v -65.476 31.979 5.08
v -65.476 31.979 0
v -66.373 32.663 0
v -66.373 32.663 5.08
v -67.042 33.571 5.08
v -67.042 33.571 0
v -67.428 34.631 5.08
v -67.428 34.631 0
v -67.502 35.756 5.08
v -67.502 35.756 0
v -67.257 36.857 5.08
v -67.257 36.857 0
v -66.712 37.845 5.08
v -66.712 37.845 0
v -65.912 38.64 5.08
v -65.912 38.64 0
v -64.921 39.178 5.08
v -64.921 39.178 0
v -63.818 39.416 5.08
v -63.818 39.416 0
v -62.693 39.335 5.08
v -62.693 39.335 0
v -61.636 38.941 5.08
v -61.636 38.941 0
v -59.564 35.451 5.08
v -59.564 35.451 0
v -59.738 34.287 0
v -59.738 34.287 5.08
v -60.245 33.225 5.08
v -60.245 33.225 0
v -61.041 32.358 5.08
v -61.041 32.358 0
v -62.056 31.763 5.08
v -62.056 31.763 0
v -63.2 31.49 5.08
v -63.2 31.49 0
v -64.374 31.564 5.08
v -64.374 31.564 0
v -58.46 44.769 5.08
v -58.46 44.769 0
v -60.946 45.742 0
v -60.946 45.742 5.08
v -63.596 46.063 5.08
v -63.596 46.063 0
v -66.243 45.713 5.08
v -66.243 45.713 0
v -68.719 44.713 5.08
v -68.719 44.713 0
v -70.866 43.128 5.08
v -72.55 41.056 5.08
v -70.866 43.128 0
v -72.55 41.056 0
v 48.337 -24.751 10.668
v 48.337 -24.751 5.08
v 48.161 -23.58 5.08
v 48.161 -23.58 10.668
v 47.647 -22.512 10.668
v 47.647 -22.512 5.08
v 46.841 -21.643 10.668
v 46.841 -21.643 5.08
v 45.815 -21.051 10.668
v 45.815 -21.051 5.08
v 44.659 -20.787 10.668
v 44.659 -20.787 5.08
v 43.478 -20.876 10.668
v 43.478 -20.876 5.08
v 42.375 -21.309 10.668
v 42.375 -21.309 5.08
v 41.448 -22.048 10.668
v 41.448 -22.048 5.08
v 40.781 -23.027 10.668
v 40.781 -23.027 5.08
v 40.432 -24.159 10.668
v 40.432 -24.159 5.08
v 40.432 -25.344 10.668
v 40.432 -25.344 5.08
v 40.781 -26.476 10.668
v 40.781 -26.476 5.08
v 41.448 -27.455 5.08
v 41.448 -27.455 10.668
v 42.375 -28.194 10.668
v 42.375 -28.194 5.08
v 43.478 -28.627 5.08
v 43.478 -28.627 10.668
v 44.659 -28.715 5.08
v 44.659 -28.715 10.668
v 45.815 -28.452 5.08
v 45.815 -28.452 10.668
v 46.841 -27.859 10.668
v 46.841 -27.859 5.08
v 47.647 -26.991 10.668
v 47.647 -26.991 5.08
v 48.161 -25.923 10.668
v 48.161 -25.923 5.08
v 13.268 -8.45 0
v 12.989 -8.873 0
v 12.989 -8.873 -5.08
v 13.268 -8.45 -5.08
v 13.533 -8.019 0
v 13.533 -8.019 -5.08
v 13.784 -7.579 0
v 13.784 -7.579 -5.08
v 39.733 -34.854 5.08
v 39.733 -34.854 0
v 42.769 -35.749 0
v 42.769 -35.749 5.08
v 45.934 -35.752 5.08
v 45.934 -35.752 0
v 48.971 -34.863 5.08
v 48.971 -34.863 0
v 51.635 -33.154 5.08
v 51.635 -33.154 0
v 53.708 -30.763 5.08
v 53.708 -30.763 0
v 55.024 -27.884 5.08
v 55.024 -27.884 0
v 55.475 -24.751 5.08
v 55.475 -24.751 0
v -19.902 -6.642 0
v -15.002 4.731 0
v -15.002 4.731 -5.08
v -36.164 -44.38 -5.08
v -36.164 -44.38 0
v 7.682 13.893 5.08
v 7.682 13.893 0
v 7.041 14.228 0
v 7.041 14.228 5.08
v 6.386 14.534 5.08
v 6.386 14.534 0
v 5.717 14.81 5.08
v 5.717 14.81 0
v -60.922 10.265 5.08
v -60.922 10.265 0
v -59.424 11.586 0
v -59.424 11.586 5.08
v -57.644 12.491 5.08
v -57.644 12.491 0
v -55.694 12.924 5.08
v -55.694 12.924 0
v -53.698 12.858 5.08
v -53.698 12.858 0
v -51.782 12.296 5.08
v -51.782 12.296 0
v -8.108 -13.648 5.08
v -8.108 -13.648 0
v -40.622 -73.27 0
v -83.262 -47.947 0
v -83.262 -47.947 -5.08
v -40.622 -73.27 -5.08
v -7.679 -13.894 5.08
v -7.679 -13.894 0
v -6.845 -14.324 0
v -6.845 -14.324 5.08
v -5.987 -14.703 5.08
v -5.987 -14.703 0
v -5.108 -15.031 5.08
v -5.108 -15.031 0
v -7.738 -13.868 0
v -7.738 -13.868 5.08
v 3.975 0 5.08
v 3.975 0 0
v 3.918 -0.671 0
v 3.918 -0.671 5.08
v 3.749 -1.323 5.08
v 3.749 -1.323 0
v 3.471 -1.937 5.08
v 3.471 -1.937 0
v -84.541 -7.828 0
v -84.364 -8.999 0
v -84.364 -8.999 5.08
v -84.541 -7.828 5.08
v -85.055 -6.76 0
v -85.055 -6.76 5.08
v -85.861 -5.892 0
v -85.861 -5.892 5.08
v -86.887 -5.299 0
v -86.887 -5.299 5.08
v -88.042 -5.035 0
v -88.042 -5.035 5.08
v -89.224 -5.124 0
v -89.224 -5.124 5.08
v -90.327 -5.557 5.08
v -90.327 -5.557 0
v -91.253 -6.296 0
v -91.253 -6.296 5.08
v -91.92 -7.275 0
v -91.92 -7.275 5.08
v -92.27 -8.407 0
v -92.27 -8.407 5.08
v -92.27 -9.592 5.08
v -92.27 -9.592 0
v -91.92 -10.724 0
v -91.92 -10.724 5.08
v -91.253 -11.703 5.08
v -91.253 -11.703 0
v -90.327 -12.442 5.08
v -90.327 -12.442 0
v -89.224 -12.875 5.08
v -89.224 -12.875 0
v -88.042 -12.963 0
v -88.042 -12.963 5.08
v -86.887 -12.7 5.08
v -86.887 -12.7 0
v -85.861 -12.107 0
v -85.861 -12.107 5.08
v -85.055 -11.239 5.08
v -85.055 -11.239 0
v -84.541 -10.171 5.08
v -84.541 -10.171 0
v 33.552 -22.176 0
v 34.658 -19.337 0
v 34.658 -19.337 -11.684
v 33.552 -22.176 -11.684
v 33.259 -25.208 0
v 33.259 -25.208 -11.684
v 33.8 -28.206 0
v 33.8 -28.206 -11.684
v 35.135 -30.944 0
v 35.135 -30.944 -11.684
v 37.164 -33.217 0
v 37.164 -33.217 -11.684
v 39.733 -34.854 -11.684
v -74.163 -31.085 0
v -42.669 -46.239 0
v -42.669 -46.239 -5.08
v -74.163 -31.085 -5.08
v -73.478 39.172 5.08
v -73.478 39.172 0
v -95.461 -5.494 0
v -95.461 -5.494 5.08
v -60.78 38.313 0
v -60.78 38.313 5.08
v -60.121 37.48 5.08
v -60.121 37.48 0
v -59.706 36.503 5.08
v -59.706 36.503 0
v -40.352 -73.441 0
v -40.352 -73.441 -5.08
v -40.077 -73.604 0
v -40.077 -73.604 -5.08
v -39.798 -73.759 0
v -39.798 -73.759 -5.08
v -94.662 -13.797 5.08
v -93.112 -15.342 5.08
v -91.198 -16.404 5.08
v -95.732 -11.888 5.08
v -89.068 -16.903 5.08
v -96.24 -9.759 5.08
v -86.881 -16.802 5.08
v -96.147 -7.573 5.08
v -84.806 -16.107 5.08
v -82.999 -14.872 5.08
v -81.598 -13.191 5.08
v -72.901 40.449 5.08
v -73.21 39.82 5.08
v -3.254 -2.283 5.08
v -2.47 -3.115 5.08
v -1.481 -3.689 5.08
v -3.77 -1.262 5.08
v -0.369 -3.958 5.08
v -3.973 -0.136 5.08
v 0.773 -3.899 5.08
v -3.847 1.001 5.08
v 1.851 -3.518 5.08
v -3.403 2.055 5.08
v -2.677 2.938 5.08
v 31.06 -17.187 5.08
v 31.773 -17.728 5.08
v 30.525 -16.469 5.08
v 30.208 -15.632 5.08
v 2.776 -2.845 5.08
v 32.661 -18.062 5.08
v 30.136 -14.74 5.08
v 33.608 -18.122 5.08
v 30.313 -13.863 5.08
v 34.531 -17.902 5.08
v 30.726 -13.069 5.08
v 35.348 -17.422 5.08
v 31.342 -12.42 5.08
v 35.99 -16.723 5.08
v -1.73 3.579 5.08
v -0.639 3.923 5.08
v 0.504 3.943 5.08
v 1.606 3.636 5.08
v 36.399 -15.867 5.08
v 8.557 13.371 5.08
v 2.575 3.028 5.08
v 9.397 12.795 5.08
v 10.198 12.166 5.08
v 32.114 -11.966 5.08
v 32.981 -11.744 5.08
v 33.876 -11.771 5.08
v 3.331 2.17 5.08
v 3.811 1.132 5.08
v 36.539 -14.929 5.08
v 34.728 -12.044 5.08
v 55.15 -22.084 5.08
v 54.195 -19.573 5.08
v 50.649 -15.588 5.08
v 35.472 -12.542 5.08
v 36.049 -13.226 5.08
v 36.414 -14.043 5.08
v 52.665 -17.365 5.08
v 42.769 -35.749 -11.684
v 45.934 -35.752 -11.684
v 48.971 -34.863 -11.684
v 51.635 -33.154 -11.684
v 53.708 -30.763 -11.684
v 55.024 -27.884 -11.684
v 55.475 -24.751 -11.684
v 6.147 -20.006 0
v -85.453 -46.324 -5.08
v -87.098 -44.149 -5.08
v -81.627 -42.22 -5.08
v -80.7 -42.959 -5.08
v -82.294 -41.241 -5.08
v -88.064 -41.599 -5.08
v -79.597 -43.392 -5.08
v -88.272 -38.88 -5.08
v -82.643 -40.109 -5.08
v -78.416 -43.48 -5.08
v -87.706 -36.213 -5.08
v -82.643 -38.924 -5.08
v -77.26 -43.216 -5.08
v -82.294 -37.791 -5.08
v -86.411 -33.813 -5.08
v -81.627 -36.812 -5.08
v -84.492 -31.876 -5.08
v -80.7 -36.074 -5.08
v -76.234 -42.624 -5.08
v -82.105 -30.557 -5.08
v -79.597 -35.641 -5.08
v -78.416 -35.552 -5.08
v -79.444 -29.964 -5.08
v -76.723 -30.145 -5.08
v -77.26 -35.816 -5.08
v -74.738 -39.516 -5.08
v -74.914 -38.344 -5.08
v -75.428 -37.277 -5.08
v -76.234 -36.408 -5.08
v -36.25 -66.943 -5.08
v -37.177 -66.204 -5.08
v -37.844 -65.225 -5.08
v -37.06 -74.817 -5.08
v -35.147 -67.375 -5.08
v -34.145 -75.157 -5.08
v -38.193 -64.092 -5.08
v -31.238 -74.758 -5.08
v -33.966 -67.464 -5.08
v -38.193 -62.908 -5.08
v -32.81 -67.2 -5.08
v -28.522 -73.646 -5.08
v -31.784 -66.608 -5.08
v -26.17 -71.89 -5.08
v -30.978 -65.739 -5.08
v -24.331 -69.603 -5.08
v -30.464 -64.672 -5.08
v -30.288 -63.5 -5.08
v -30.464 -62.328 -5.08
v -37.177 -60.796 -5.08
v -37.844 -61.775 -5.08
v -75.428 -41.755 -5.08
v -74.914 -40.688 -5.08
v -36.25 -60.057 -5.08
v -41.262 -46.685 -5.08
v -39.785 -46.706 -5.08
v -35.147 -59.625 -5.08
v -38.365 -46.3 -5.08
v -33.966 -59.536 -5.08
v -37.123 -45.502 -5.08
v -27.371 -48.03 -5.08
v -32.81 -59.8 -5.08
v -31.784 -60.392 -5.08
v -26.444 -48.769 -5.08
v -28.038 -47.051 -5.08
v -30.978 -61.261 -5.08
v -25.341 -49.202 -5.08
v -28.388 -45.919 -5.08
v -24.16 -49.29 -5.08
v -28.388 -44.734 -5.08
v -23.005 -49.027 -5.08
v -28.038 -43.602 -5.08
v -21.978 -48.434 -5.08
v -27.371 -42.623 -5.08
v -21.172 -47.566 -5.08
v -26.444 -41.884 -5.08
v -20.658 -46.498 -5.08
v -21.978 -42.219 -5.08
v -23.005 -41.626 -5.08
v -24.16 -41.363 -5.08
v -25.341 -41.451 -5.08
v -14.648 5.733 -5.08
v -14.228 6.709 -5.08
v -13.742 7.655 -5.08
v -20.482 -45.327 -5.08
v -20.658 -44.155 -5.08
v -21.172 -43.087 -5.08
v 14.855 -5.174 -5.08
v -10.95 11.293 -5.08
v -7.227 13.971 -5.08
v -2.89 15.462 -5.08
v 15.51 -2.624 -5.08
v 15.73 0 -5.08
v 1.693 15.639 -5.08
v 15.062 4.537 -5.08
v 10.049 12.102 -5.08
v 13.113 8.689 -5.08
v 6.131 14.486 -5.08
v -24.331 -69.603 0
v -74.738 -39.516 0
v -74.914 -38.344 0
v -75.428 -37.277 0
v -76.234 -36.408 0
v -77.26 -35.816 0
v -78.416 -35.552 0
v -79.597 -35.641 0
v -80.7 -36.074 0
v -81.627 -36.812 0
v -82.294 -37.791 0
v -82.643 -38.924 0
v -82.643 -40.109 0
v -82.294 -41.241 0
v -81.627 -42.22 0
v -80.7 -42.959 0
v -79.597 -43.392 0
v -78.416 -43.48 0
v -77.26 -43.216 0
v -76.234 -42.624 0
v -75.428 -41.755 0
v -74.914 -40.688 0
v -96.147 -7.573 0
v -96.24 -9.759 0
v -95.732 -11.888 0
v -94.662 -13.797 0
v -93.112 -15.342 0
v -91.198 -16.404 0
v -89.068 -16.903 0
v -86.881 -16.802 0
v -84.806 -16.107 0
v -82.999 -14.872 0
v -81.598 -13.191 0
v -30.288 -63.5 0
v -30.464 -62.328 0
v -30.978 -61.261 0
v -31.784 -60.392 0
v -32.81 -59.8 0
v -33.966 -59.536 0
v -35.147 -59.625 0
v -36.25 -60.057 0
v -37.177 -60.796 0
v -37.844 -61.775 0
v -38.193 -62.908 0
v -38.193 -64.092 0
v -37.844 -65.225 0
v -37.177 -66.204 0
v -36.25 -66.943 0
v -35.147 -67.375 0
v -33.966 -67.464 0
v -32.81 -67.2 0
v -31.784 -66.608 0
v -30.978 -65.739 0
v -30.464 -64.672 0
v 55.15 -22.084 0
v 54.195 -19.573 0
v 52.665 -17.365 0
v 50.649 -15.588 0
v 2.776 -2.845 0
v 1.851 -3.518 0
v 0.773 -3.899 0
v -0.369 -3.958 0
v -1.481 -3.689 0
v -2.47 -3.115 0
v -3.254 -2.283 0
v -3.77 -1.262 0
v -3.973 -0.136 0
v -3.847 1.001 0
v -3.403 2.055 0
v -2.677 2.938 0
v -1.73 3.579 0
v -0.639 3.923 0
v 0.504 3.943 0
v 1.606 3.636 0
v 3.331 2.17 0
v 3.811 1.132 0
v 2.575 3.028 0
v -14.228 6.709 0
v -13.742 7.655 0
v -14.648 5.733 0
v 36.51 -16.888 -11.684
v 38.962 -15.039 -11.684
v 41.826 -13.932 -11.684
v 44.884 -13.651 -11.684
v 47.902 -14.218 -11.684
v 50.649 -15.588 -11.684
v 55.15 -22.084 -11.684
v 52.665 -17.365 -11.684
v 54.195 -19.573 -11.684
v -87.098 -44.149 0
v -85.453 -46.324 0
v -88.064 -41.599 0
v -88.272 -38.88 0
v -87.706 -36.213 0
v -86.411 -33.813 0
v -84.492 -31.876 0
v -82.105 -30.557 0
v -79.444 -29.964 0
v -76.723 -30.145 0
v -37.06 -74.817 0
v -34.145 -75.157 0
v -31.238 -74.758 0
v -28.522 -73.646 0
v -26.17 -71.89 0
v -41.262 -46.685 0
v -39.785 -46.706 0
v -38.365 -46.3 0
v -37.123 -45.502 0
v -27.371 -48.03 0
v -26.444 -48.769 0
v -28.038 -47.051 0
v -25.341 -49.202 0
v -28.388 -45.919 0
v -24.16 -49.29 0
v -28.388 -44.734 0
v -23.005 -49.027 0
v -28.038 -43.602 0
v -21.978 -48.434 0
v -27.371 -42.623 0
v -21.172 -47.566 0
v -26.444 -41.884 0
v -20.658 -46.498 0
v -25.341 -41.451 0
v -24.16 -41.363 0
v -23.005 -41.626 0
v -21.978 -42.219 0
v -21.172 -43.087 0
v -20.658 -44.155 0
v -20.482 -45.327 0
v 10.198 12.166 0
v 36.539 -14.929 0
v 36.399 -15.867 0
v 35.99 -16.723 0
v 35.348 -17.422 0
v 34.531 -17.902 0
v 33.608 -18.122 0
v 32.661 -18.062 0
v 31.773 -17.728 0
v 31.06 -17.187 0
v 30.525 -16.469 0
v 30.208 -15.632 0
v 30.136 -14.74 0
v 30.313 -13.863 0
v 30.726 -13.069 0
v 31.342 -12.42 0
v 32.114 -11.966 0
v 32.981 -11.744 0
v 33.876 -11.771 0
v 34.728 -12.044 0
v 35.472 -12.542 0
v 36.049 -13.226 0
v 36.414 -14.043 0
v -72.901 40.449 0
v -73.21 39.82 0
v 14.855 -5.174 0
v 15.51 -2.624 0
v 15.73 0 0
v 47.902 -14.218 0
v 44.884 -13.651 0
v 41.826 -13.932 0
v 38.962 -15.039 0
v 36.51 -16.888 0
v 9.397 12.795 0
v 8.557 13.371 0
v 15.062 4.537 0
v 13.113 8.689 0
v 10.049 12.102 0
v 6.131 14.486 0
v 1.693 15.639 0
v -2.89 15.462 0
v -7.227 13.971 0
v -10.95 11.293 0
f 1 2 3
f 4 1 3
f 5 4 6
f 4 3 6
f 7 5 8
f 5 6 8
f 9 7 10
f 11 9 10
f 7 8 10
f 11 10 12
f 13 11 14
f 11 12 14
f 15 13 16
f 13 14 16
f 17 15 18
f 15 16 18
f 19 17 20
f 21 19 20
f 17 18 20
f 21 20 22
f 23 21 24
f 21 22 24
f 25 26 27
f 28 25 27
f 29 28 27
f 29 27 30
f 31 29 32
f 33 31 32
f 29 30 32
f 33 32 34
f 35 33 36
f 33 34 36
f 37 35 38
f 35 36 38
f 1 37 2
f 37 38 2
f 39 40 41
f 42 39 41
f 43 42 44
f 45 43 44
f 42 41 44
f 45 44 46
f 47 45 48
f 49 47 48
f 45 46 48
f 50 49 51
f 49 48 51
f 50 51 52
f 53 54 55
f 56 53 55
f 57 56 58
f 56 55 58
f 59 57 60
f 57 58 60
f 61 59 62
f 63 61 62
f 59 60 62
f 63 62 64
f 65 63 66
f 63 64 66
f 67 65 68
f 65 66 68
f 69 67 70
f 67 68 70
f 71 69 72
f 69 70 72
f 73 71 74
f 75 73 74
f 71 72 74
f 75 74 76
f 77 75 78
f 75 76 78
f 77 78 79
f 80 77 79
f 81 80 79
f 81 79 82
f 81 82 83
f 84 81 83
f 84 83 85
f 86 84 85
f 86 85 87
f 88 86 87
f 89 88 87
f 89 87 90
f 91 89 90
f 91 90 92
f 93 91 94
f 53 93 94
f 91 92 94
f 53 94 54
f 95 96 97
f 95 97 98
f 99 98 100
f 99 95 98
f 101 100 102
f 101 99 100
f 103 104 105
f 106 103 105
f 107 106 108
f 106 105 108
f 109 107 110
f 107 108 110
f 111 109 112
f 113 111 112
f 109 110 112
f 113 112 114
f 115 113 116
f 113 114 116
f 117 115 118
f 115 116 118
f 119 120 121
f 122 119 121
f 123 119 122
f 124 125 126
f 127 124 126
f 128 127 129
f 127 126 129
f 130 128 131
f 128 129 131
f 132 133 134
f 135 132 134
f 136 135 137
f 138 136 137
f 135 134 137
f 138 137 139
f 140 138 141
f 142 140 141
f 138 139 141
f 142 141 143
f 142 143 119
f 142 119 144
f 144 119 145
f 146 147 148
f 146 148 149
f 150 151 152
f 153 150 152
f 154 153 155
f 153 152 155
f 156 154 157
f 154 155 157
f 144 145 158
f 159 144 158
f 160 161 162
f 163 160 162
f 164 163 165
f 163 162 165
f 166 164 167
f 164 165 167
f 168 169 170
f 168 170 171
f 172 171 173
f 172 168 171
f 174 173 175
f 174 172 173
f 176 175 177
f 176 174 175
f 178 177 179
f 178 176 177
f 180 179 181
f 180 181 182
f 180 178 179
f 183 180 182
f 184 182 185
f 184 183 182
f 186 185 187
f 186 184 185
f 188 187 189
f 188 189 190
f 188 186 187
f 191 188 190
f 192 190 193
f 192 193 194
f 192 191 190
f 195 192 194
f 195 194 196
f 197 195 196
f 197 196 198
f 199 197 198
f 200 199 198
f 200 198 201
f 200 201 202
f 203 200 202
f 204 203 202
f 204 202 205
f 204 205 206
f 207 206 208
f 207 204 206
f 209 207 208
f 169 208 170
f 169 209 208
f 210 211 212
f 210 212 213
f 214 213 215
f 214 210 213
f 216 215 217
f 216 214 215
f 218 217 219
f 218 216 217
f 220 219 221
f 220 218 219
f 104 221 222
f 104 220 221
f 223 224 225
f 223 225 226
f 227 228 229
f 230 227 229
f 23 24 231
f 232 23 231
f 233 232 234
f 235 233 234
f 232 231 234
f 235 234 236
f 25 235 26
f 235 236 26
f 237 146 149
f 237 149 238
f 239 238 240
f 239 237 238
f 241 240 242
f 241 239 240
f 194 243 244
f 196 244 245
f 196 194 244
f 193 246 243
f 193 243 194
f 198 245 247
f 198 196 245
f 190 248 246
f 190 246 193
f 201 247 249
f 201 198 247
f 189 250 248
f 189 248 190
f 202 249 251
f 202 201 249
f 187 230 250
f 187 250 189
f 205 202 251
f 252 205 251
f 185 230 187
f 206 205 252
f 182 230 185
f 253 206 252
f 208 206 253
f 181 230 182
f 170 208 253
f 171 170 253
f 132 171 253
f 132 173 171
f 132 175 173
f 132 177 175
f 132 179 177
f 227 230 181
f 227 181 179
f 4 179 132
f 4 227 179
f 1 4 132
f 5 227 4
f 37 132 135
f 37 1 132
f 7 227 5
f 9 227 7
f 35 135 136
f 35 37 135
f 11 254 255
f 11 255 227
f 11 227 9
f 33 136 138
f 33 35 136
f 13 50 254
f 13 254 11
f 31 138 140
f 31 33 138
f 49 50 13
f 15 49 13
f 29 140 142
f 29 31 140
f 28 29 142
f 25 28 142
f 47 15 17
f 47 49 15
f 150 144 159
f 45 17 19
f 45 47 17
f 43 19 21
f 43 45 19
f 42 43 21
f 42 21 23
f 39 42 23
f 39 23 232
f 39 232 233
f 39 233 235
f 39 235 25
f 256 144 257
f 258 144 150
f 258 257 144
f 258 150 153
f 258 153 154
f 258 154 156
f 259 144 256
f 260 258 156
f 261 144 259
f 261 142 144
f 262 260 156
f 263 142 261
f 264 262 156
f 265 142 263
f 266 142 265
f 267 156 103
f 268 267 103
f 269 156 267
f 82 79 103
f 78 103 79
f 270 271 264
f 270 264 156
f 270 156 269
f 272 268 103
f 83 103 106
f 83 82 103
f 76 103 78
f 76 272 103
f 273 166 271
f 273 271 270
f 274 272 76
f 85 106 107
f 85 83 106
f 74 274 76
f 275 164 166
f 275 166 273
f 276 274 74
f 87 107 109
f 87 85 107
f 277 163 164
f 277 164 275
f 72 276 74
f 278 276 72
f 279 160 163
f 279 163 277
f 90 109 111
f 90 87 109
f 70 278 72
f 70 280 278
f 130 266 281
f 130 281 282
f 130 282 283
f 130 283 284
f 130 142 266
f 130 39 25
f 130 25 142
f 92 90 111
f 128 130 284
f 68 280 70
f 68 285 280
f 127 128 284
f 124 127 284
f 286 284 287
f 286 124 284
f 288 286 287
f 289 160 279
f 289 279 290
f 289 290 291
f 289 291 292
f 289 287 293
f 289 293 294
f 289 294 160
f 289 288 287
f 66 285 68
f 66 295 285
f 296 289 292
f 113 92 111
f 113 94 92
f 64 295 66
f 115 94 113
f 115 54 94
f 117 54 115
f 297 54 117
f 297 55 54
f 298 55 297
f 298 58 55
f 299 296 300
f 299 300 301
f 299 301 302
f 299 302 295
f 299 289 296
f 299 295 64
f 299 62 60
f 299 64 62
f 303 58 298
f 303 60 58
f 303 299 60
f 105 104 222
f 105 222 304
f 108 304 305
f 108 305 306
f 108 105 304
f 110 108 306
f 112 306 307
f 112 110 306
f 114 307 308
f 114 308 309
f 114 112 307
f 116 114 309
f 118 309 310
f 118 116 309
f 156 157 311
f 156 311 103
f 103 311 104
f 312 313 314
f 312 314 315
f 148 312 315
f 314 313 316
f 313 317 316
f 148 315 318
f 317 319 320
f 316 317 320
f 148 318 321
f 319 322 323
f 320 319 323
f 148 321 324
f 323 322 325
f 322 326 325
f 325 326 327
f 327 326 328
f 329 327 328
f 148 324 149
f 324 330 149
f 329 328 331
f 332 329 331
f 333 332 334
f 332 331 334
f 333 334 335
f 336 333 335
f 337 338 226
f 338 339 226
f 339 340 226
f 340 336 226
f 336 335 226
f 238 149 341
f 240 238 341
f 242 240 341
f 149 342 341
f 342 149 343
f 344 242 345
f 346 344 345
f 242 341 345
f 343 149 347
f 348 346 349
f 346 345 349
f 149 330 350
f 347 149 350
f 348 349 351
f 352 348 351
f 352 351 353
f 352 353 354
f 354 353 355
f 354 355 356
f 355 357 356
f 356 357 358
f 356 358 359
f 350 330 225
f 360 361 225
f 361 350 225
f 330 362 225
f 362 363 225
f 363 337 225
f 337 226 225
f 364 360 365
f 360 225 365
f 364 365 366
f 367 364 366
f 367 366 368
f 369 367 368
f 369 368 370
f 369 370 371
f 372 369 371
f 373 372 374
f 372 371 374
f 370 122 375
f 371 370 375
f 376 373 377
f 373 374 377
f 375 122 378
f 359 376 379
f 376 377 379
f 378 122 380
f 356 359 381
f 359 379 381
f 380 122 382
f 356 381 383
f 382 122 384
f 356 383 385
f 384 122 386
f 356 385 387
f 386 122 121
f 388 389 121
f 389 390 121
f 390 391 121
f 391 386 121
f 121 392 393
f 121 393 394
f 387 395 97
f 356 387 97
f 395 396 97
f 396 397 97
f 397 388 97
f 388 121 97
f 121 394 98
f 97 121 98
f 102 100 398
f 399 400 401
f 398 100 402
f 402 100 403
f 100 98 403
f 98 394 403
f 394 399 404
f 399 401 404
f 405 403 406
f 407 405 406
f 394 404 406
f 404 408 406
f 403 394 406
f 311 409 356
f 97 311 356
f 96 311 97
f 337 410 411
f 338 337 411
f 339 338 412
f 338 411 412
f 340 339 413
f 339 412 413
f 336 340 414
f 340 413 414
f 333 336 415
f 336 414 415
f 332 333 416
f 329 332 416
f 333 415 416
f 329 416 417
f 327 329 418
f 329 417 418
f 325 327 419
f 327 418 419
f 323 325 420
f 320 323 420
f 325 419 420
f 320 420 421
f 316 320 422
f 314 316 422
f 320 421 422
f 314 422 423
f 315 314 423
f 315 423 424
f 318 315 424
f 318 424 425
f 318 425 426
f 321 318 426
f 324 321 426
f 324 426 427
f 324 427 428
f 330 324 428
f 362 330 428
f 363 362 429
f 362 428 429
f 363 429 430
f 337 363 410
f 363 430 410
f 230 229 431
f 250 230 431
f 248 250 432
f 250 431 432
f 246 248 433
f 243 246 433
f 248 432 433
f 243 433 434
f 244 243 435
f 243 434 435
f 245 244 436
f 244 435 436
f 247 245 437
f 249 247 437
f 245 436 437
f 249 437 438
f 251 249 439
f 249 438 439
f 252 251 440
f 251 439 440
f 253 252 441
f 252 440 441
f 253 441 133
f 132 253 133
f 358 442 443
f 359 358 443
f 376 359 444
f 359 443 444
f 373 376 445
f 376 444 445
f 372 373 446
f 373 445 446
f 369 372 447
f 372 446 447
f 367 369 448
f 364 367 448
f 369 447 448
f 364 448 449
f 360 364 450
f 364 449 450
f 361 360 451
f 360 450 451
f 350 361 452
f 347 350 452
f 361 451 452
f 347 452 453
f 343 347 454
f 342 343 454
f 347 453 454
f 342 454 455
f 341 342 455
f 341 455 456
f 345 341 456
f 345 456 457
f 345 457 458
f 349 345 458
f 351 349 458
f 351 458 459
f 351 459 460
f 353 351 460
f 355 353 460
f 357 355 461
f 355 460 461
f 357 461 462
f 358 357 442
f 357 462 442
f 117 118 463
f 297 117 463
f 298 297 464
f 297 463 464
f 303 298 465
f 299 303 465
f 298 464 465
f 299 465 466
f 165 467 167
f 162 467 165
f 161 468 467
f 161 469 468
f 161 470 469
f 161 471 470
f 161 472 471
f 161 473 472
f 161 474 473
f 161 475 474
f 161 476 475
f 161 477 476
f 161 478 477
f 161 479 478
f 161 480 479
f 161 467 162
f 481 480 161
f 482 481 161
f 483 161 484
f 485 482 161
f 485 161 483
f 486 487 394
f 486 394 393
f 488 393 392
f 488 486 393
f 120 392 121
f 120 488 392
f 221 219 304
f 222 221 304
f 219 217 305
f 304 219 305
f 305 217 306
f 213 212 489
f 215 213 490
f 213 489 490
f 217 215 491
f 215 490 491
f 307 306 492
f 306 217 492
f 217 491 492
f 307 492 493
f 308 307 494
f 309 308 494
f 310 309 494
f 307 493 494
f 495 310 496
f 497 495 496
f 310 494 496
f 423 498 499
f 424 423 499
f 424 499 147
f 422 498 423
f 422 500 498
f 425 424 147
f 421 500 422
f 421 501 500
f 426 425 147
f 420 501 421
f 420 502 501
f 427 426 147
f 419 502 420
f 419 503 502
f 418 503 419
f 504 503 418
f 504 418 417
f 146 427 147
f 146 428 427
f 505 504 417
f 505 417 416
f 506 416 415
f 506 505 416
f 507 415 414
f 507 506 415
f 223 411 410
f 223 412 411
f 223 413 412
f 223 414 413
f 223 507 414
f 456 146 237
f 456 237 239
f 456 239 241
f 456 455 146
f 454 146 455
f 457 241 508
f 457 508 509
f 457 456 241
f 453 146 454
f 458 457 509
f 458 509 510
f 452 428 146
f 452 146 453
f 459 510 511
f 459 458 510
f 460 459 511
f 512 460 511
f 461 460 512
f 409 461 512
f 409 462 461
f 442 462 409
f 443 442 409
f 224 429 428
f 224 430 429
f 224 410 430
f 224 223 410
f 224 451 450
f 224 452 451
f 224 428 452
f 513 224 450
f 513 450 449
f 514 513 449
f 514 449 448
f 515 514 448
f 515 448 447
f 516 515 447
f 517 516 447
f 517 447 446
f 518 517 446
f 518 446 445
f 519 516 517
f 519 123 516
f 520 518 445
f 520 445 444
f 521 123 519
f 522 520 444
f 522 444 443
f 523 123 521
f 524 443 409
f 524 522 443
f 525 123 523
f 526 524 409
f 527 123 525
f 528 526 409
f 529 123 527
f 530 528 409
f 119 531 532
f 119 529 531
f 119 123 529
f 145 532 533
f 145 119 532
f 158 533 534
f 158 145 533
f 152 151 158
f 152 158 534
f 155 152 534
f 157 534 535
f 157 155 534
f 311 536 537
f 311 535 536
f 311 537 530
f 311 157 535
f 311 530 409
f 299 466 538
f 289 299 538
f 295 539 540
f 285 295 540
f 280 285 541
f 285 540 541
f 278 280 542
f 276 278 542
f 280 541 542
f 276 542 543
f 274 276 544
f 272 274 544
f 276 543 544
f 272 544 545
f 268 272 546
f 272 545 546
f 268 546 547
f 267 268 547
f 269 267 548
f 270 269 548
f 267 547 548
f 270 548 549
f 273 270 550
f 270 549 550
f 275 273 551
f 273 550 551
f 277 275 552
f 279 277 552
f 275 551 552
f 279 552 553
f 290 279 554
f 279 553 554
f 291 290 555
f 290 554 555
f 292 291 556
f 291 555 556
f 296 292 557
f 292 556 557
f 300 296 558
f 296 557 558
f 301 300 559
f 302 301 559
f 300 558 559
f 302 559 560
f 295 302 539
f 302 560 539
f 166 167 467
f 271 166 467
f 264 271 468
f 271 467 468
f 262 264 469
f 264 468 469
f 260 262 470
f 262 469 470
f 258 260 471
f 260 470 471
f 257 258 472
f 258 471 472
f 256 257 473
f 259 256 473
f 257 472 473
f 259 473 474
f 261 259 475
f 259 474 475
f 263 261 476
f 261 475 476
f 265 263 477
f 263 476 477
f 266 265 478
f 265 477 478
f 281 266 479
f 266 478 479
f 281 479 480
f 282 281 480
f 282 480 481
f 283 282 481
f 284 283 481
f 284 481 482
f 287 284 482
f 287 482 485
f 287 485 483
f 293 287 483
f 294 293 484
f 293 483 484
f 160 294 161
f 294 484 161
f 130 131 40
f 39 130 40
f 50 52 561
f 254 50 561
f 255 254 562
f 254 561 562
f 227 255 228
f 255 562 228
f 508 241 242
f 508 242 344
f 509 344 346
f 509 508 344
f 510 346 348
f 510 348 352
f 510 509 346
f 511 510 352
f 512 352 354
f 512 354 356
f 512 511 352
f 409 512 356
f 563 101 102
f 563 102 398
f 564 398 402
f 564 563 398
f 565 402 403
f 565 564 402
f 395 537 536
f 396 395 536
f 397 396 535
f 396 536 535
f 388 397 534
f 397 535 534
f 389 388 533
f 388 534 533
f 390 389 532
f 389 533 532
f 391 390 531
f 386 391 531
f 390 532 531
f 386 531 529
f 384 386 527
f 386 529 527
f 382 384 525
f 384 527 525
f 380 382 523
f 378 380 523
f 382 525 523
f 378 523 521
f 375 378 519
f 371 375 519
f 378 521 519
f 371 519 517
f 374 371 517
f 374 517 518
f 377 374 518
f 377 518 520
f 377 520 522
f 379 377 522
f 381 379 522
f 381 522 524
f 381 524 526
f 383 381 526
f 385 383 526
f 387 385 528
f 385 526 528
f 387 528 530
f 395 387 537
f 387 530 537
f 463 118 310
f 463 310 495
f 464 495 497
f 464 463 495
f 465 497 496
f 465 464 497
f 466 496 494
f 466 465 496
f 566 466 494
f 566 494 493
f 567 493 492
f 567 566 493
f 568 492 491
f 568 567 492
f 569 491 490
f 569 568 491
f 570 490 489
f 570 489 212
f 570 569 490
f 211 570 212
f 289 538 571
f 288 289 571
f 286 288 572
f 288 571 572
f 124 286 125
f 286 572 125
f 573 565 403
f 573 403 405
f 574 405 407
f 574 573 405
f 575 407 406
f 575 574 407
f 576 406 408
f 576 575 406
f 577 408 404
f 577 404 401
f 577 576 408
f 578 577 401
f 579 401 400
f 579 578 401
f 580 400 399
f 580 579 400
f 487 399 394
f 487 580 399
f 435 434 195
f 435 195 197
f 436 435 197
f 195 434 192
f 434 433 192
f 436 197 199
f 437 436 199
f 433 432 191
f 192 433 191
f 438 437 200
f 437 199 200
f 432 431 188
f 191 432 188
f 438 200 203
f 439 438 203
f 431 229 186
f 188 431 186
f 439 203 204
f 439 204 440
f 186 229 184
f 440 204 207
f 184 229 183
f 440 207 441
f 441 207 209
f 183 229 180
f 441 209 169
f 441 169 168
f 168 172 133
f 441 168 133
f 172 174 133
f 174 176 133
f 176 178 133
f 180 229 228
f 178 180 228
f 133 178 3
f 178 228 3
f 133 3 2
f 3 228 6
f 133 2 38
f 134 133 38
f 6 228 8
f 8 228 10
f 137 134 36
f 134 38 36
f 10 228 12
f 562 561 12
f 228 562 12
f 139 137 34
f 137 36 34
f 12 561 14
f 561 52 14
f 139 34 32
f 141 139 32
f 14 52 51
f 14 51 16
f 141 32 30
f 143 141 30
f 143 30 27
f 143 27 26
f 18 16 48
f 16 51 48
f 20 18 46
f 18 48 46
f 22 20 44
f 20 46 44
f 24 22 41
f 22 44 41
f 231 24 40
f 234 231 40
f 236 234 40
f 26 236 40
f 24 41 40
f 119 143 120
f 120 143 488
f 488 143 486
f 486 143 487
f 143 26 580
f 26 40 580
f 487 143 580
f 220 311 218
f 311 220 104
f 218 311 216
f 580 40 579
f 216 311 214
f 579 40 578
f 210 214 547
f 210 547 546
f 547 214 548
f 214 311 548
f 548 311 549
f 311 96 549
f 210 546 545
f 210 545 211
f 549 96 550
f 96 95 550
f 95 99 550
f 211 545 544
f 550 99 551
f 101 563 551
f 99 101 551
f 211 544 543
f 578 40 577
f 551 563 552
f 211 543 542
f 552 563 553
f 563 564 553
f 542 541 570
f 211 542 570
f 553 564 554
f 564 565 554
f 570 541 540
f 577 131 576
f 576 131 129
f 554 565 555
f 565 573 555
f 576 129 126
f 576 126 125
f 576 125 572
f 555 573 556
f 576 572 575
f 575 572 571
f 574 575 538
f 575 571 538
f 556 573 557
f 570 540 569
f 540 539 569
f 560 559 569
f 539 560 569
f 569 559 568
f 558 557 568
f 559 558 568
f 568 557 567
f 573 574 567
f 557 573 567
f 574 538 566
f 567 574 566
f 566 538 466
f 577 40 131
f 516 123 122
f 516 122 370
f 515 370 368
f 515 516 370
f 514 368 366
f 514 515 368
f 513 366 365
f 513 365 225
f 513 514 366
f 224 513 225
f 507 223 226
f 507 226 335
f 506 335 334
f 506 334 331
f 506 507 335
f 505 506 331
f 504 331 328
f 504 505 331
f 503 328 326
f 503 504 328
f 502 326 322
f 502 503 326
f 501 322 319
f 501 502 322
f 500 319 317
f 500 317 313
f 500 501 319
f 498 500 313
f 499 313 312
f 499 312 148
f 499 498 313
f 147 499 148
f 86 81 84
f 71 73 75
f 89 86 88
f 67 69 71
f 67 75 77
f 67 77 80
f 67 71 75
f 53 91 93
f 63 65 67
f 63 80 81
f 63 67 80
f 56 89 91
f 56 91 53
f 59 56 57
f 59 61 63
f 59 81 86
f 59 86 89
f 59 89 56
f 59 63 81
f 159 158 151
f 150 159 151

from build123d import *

# Parameters (mm, degrees)
F0_R     = 3.9751
F2_DEPTH = 5.08
F1_R     = 3.9751
F3_DEPTH = 5.08
F4_DEPTH = 11.684
F5_R     = 3.9751
F6_DEPTH = 5.588


with BuildPart() as f2:
    # F0 (on Top) → F2 (new body)
    with BuildSketch(Plane.XY):
        with BuildLine():
            ThreePointArc((13.8632166565, -7.7347817639), (15.3638242216, -3.99606435), (15.875, 0))
            ThreePointArc((15.875, 0), (14.3858140768, 6.7129709032), (10.1976483972, 12.1664946541))
            Line((10.1976483972, 12.1664946541), (7.6820147458, 13.8925258483))
            Line((7.6820147458, 13.8925258483), (5.7169083245, 14.809881303))
            ThreePointArc((5.7169083245, 14.809881303), (-5.3948904745, 14.9301969769), (-13.8632166565, 7.7347817639))
            Line((-13.8632166565, 7.7347817639), (-3.4713494508, 1.9367893537))
            ThreePointArc((-3.4713494508, 1.9367893537), (1.0006145132, 3.8471015851), (3.9751, 0))
            ThreePointArc((3.9751, 0), (3.8471015851, -1.0006145132), (3.4713494508, -1.9367893537))
            Line((3.4713494508, -1.9367893537), (13.8632166565, -7.7347817639))
        make_face()
        with BuildLine():
            ThreePointArc((10.1976483972, 12.1664946541), (14.3858140768, 6.7129709032), (15.875, 0))
            ThreePointArc((15.875, 0), (15.3638242216, -3.99606435), (13.8632166565, -7.7347817639))
            Line((13.8632166565, -7.7347817639), (31.7734974812, -17.7275646038))
            Line((31.7734974812, -17.7275646038), (34.6580416412, -19.3369544098))
            ThreePointArc((34.6580416412, -19.3369544098), (41.8260256064, -13.9321056286), (50.6492670067, -15.5882444108))
            Line((50.6492670067, -15.5882444108), (10.1976483972, 12.1664946541))
        make_face()
        with BuildLine():
            ThreePointArc((36.5392641606, -14.9291966376), (34.9573662508, -17.6925006073), (31.7734974812, -17.7275646038))
            ThreePointArc((31.7734974812, -17.7275646038), (31.7122467013, -12.1658926679), (36.5392641606, -14.9291966376))
        make_face(mode=Mode.SUBTRACT)
        with BuildLine():
            Line((7.6820147458, 13.8925258483), (10.1976483972, 12.1664946541))
            ThreePointArc((10.1976483972, 12.1664946541), (8.9813910085, 13.0900817626), (7.6820147458, 13.8925258483))
        make_face()
        with BuildLine():
            Line((31.7734974812, -17.7275646038), (13.8632166565, -7.7347817639))
            ThreePointArc((13.8632166565, -7.7347817639), (5.6982296892, -14.8170780996), (-5.1082641413, -15.0306773787))
            Line((-5.1082641413, -15.0306773787), (39.7328392371, -34.8535692773))
            ThreePointArc((39.7328392371, -34.8535692773), (33.8003278503, -28.2056528245), (34.6580416412, -19.3369544098))
            Line((34.6580416412, -19.3369544098), (31.7734974812, -17.7275646038))
        make_face()
        with BuildLine():
            ThreePointArc((-5.1082641413, -15.0306773787), (5.6982296892, -14.8170780996), (13.8632166565, -7.7347817639))
            Line((13.8632166565, -7.7347817639), (3.4713494508, -1.9367893537))
            ThreePointArc((3.4713494508, -1.9367893537), (-1.9367893537, -3.4713494508), (-3.4713494508, 1.9367893537))
            Line((-3.4713494508, 1.9367893537), (-13.8632166565, 7.7347817639))
            ThreePointArc((-13.8632166565, 7.7347817639), (-15.3294442901, -4.1259862767), (-8.1078440126, -13.648387834))
            ThreePointArc((-8.1078440126, -13.648387834), (-7.8941969638, -13.7730635407), (-7.6786332134, -13.894395164))
            Line((-7.6786332134, -13.894395164), (-5.1082641413, -15.0306773787))
        make_face()
        with BuildLine():
            Line((5.7169083245, 14.809881303), (7.6820147458, 13.8925258483))
            ThreePointArc((7.6820147458, 13.8925258483), (6.7151448323, 14.3847994383), (5.7169083245, 14.809881303))
        make_face()
        with BuildLine():
            ThreePointArc((55.4747933007, -24.7513016446), (54.1946798767, -19.573287501), (50.6492670067, -15.5882444108))
            ThreePointArc((50.6492670067, -15.5882444108), (41.8260256064, -13.9321056286), (34.6580416412, -19.3369544098))
            ThreePointArc((34.6580416412, -19.3369544098), (33.8003278503, -28.2056528245), (39.7328392371, -34.8535692773))
            ThreePointArc((39.7328392371, -34.8535692773), (50.3640783672, -34.103639976), (55.4747933007, -24.7513016446))
        make_face()
        with BuildLine():
            ThreePointArc((-7.6786332134, -13.894395164), (-6.4186424038, -14.519526669), (-5.1082641413, -15.0306773787))
            Line((-5.1082641413, -15.0306773787), (-7.6786332134, -13.894395164))
        make_face()
        with BuildLine():
            ThreePointArc((-13.8632166565, 7.7347817639), (-5.3948904745, 14.9301969769), (5.7169083245, 14.809881303))
            Line((5.7169083245, 14.809881303), (-58.4596772524, 44.7689411315))
            ThreePointArc((-58.4596772524, 44.7689411315), (-54.4137482289, 40.8693424861), (-52.9260797167, 35.4505553842))
            ThreePointArc((-52.9260797167, 35.4505553842), (-53.26780974, 32.7791158887), (-54.2709923631, 30.2797173587))
            Line((-54.2709923631, 30.2797173587), (-13.8632166565, 7.7347817639))
        make_face()
        with BuildLine():
            Line((-7.7376268055, -13.8683158861), (-7.6786332134, -13.894395164))
            ThreePointArc((-7.6786332134, -13.894395164), (-7.8941969638, -13.7730635407), (-8.1078440126, -13.648387834))
            Line((-8.1078440126, -13.648387834), (-7.7376268055, -13.8683158861))
        make_face()
        with BuildLine():
            ThreePointArc((-8.1078440126, -13.648387834), (-15.3294442901, -4.1259862767), (-13.8632166565, 7.7347817639))
            Line((-13.8632166565, 7.7347817639), (-54.2709923631, 30.2797173587))
            ThreePointArc((-54.2709923631, 30.2797173587), (-60.6418041852, 25.2408931053), (-68.7096352252, 26.1827505475))
            Line((-68.7096352252, 26.1827505475), (-84.4716426501, -2.0678362876))
            ThreePointArc((-84.4716426501, -2.0678362876), (-81.4942792861, -4.9803345698), (-80.4015335321, -8.9994446158))
            ThreePointArc((-80.4015335321, -8.9994446158), (-80.7066188645, -11.1789290943), (-81.5984223741, -13.1908724713))
            Line((-81.5984223741, -13.1908724713), (-60.9219558537, 10.2652302012))
            ThreePointArc((-60.9219558537, 10.2652302012), (-56.6827002782, 12.7689617881), (-51.7820296359, 12.2963235016))
            Line((-51.7820296359, 12.2963235016), (-8.1078440126, -13.648387834))
        make_face()
        with BuildLine():
            Line((-61.636361774, 38.9408504234), (-58.4596772524, 44.7689411315))
            ThreePointArc((-58.4596772524, 44.7689411315), (-66.2429409396, 45.7129809751), (-72.5503531982, 41.0560554387))
            Line((-72.5503531982, 41.0560554387), (-73.4777276016, 39.1717695464))
            ThreePointArc((-73.4777276016, 39.1717695464), (-73.5014740047, 31.7933921044), (-68.7096352252, 26.1827505475))
            Line((-68.7096352252, 26.1827505475), (-65.4755865534, 31.9792059334))
            ThreePointArc((-65.4755865534, 31.9792059334), (-67.0196618264, 37.3701911466), (-61.636361774, 38.9408504234))
        make_face()
        with BuildLine():
            ThreePointArc((-52.9260797167, 35.4505553842), (-54.4137482289, 40.8693424861), (-58.4596772524, 44.7689411315))
            Line((-58.4596772524, 44.7689411315), (-61.636361774, 38.9408504234))
            ThreePointArc((-61.636361774, 38.9408504234), (-60.1209183933, 37.4802165565), (-59.5636971997, 35.4505553842))
            ThreePointArc((-59.5636971997, 35.4505553842), (-61.5260268887, 32.0227024578), (-65.4755865534, 31.9792059334))
            Line((-65.4755865534, 31.9792059334), (-68.7096352252, 26.1827505475))
            ThreePointArc((-68.7096352252, 26.1827505475), (-60.6418041852, 25.2408931053), (-54.2709923631, 30.2797173587))
            ThreePointArc((-54.2709923631, 30.2797173587), (-53.26780974, 32.7791158887), (-52.9260797167, 35.4505553842))
        make_face()
        with BuildLine():
            Line((-73.4777276016, 39.1717695464), (-72.5503531982, 41.0560554387))
            ThreePointArc((-72.5503531982, 41.0560554387), (-73.0607648028, 40.1369084802), (-73.4777276016, 39.1717695464))
        make_face()
        with BuildLine():
            Line((-84.4716426501, -2.0678362876), (-68.7096352252, 26.1827505475))
            ThreePointArc((-68.7096352252, 26.1827505475), (-73.5014740047, 31.7933921044), (-73.4777276016, 39.1717695464))
            Line((-73.4777276016, 39.1717695464), (-95.4607361469, -5.4944113612))
            ThreePointArc((-95.4607361469, -5.4944113612), (-90.7018687776, -1.4217856203), (-84.4716426501, -2.0678362876))
        make_face()
        with BuildLine():
            ThreePointArc((-80.4015335321, -8.9994446158), (-81.4942792861, -4.9803345698), (-84.4716426501, -2.0678362876))
            ThreePointArc((-84.4716426501, -2.0678362876), (-90.7018687776, -1.4217856203), (-95.4607361469, -5.4944113612))
            ThreePointArc((-95.4607361469, -5.4944113612), (-92.1919786497, -15.9390930342), (-81.5984223741, -13.1908724713))
            ThreePointArc((-81.5984223741, -13.1908724713), (-80.7066188645, -11.1789290943), (-80.4015335321, -8.9994446158))
        make_face()
        with Locations((-88.3390335321, -8.9994446158)):
            Circle(F0_R, mode=Mode.SUBTRACT)
    extrude(amount=F2_DEPTH)

    # F1 (on Top) → F3 (join)
    with BuildSketch(Plane.XY):
        with BuildLine():
            ThreePointArc((13.783733636, -7.5792129349), (15.2357338896, -3.9125687862), (15.7300915973, 0))
            ThreePointArc((15.7300915973, 0), (3.9542752536, 15.2249626889), (-13.7420176329, 7.6545890181))
            Line((-13.7420176329, 7.6545890181), (-15.0017707782, 4.7310310903))
            ThreePointArc((-15.0017707782, 4.7310310903), (-6.8759912191, -14.1476685859), (12.9887925768, -8.8728264413))
            Line((12.9887925768, -8.8728264413), (13.783733636, -7.5792129349))
        make_face()
        with BuildLine():
            Line((-15.0017707782, 4.7310310903), (-13.7420176329, 7.6545890181))
            ThreePointArc((-13.7420176329, 7.6545890181), (-14.4460423921, 6.2247603058), (-15.0017707782, 4.7310310903))
        make_face()
        with BuildLine():
            ThreePointArc((12.9887925768, -8.8728264413), (13.4018804251, -8.2356167183), (13.783733636, -7.5792129349))
            Line((13.783733636, -7.5792129349), (12.9887925768, -8.8728264413))
        make_face()
        with BuildLine():
            ThreePointArc((12.9887925768, -8.8728264413), (-6.8759912191, -14.1476685859), (-15.0017707782, 4.7310310903))
            Line((-15.0017707782, 4.7310310903), (-36.1635312438, -44.3798862398))
            ThreePointArc((-36.1635312438, -44.3798862398), (-39.06045855, -46.5553430524), (-42.6694117486, -46.2387092412))
            Line((-42.6694117486, -46.2387092412), (-74.1634497839, -31.0848952742))
            ThreePointArc((-74.1634497839, -31.0848952742), (-70.4857810686, -34.6070314802), (-69.1324393881, -39.5161206961))
            ThreePointArc((-69.1324393881, -39.5161206961), (-73.803595504, -47.7430243474), (-83.2619196558, -47.947346118))
            Line((-83.2619196558, -47.947346118), (-40.6218787266, -73.2700041298))
            ThreePointArc((-40.6218787266, -73.2700041298), (-39.8197245124, -53.2524813805), (-22.6053981954, -63.5))
            ThreePointArc((-22.6053981954, -63.5), (-23.0450371975, -66.6712321227), (-24.3307934072, -69.6032666718))
            Line((-24.3307934072, -69.6032666718), (12.9887925768, -8.8728264413))
        make_face()
        with Locations((-24.4568177487, -45.3265101594)):
            Circle(F1_R, mode=Mode.SUBTRACT)
        with BuildLine():
            ThreePointArc((-39.7982146858, -73.7591538203), (-31.2378131903, -74.7579963289), (-24.3307934072, -69.6032666718))
            ThreePointArc((-24.3307934072, -69.6032666718), (-23.0450371975, -66.6712321227), (-22.6053981954, -63.5))
            ThreePointArc((-22.6053981954, -63.5), (-39.8197245124, -53.2524813805), (-40.6218787266, -73.2700041298))
            Line((-40.6218787266, -73.2700041298), (-39.7982146858, -73.7591538203))
        make_face()
        with Locations((-34.2626847198, -63.5)):
            Circle(F1_R, mode=Mode.SUBTRACT)
        with BuildLine():
            ThreePointArc((-40.6218787266, -73.2700041298), (-40.215073438, -73.5230433333), (-39.7982146858, -73.7591538203))
            Line((-39.7982146858, -73.7591538203), (-40.6218787266, -73.2700041298))
        make_face()
        with BuildLine():
            ThreePointArc((-69.1324393881, -39.5161206961), (-70.4857810686, -34.6070314802), (-74.1634497839, -31.0848952742))
            ThreePointArc((-74.1634497839, -31.0848952742), (-87.1439101417, -34.9668857602), (-83.2619196558, -47.947346118))
            ThreePointArc((-83.2619196558, -47.947346118), (-73.803595504, -47.7430243474), (-69.1324393881, -39.5161206961))
        make_face()
        with Locations((-78.7126847198, -39.5161206961)):
            Circle(F1_R, mode=Mode.SUBTRACT)
    extrude(amount=-F3_DEPTH)

    # F0 (on Top) → F4 (join)
    with BuildSketch(Plane.XY):
        with BuildLine():
            ThreePointArc((55.4747933007, -24.7513016446), (54.1946798767, -19.573287501), (50.6492670067, -15.5882444108))
            ThreePointArc((50.6492670067, -15.5882444108), (41.8260256064, -13.9321056286), (34.6580416412, -19.3369544098))
            ThreePointArc((34.6580416412, -19.3369544098), (33.8003278503, -28.2056528245), (39.7328392371, -34.8535692773))
            ThreePointArc((39.7328392371, -34.8535692773), (50.3640783672, -34.103639976), (55.4747933007, -24.7513016446))
        make_face()
    extrude(amount=-F4_DEPTH)

    # F5 (on face) → F6 (join)
    with BuildSketch(Plane.XY.offset(5.08)):
        with Locations((44.3622933007, -24.7513016446)):
            Circle(F5_R)
    extrude(amount=F6_DEPTH)


solid = f2.part
